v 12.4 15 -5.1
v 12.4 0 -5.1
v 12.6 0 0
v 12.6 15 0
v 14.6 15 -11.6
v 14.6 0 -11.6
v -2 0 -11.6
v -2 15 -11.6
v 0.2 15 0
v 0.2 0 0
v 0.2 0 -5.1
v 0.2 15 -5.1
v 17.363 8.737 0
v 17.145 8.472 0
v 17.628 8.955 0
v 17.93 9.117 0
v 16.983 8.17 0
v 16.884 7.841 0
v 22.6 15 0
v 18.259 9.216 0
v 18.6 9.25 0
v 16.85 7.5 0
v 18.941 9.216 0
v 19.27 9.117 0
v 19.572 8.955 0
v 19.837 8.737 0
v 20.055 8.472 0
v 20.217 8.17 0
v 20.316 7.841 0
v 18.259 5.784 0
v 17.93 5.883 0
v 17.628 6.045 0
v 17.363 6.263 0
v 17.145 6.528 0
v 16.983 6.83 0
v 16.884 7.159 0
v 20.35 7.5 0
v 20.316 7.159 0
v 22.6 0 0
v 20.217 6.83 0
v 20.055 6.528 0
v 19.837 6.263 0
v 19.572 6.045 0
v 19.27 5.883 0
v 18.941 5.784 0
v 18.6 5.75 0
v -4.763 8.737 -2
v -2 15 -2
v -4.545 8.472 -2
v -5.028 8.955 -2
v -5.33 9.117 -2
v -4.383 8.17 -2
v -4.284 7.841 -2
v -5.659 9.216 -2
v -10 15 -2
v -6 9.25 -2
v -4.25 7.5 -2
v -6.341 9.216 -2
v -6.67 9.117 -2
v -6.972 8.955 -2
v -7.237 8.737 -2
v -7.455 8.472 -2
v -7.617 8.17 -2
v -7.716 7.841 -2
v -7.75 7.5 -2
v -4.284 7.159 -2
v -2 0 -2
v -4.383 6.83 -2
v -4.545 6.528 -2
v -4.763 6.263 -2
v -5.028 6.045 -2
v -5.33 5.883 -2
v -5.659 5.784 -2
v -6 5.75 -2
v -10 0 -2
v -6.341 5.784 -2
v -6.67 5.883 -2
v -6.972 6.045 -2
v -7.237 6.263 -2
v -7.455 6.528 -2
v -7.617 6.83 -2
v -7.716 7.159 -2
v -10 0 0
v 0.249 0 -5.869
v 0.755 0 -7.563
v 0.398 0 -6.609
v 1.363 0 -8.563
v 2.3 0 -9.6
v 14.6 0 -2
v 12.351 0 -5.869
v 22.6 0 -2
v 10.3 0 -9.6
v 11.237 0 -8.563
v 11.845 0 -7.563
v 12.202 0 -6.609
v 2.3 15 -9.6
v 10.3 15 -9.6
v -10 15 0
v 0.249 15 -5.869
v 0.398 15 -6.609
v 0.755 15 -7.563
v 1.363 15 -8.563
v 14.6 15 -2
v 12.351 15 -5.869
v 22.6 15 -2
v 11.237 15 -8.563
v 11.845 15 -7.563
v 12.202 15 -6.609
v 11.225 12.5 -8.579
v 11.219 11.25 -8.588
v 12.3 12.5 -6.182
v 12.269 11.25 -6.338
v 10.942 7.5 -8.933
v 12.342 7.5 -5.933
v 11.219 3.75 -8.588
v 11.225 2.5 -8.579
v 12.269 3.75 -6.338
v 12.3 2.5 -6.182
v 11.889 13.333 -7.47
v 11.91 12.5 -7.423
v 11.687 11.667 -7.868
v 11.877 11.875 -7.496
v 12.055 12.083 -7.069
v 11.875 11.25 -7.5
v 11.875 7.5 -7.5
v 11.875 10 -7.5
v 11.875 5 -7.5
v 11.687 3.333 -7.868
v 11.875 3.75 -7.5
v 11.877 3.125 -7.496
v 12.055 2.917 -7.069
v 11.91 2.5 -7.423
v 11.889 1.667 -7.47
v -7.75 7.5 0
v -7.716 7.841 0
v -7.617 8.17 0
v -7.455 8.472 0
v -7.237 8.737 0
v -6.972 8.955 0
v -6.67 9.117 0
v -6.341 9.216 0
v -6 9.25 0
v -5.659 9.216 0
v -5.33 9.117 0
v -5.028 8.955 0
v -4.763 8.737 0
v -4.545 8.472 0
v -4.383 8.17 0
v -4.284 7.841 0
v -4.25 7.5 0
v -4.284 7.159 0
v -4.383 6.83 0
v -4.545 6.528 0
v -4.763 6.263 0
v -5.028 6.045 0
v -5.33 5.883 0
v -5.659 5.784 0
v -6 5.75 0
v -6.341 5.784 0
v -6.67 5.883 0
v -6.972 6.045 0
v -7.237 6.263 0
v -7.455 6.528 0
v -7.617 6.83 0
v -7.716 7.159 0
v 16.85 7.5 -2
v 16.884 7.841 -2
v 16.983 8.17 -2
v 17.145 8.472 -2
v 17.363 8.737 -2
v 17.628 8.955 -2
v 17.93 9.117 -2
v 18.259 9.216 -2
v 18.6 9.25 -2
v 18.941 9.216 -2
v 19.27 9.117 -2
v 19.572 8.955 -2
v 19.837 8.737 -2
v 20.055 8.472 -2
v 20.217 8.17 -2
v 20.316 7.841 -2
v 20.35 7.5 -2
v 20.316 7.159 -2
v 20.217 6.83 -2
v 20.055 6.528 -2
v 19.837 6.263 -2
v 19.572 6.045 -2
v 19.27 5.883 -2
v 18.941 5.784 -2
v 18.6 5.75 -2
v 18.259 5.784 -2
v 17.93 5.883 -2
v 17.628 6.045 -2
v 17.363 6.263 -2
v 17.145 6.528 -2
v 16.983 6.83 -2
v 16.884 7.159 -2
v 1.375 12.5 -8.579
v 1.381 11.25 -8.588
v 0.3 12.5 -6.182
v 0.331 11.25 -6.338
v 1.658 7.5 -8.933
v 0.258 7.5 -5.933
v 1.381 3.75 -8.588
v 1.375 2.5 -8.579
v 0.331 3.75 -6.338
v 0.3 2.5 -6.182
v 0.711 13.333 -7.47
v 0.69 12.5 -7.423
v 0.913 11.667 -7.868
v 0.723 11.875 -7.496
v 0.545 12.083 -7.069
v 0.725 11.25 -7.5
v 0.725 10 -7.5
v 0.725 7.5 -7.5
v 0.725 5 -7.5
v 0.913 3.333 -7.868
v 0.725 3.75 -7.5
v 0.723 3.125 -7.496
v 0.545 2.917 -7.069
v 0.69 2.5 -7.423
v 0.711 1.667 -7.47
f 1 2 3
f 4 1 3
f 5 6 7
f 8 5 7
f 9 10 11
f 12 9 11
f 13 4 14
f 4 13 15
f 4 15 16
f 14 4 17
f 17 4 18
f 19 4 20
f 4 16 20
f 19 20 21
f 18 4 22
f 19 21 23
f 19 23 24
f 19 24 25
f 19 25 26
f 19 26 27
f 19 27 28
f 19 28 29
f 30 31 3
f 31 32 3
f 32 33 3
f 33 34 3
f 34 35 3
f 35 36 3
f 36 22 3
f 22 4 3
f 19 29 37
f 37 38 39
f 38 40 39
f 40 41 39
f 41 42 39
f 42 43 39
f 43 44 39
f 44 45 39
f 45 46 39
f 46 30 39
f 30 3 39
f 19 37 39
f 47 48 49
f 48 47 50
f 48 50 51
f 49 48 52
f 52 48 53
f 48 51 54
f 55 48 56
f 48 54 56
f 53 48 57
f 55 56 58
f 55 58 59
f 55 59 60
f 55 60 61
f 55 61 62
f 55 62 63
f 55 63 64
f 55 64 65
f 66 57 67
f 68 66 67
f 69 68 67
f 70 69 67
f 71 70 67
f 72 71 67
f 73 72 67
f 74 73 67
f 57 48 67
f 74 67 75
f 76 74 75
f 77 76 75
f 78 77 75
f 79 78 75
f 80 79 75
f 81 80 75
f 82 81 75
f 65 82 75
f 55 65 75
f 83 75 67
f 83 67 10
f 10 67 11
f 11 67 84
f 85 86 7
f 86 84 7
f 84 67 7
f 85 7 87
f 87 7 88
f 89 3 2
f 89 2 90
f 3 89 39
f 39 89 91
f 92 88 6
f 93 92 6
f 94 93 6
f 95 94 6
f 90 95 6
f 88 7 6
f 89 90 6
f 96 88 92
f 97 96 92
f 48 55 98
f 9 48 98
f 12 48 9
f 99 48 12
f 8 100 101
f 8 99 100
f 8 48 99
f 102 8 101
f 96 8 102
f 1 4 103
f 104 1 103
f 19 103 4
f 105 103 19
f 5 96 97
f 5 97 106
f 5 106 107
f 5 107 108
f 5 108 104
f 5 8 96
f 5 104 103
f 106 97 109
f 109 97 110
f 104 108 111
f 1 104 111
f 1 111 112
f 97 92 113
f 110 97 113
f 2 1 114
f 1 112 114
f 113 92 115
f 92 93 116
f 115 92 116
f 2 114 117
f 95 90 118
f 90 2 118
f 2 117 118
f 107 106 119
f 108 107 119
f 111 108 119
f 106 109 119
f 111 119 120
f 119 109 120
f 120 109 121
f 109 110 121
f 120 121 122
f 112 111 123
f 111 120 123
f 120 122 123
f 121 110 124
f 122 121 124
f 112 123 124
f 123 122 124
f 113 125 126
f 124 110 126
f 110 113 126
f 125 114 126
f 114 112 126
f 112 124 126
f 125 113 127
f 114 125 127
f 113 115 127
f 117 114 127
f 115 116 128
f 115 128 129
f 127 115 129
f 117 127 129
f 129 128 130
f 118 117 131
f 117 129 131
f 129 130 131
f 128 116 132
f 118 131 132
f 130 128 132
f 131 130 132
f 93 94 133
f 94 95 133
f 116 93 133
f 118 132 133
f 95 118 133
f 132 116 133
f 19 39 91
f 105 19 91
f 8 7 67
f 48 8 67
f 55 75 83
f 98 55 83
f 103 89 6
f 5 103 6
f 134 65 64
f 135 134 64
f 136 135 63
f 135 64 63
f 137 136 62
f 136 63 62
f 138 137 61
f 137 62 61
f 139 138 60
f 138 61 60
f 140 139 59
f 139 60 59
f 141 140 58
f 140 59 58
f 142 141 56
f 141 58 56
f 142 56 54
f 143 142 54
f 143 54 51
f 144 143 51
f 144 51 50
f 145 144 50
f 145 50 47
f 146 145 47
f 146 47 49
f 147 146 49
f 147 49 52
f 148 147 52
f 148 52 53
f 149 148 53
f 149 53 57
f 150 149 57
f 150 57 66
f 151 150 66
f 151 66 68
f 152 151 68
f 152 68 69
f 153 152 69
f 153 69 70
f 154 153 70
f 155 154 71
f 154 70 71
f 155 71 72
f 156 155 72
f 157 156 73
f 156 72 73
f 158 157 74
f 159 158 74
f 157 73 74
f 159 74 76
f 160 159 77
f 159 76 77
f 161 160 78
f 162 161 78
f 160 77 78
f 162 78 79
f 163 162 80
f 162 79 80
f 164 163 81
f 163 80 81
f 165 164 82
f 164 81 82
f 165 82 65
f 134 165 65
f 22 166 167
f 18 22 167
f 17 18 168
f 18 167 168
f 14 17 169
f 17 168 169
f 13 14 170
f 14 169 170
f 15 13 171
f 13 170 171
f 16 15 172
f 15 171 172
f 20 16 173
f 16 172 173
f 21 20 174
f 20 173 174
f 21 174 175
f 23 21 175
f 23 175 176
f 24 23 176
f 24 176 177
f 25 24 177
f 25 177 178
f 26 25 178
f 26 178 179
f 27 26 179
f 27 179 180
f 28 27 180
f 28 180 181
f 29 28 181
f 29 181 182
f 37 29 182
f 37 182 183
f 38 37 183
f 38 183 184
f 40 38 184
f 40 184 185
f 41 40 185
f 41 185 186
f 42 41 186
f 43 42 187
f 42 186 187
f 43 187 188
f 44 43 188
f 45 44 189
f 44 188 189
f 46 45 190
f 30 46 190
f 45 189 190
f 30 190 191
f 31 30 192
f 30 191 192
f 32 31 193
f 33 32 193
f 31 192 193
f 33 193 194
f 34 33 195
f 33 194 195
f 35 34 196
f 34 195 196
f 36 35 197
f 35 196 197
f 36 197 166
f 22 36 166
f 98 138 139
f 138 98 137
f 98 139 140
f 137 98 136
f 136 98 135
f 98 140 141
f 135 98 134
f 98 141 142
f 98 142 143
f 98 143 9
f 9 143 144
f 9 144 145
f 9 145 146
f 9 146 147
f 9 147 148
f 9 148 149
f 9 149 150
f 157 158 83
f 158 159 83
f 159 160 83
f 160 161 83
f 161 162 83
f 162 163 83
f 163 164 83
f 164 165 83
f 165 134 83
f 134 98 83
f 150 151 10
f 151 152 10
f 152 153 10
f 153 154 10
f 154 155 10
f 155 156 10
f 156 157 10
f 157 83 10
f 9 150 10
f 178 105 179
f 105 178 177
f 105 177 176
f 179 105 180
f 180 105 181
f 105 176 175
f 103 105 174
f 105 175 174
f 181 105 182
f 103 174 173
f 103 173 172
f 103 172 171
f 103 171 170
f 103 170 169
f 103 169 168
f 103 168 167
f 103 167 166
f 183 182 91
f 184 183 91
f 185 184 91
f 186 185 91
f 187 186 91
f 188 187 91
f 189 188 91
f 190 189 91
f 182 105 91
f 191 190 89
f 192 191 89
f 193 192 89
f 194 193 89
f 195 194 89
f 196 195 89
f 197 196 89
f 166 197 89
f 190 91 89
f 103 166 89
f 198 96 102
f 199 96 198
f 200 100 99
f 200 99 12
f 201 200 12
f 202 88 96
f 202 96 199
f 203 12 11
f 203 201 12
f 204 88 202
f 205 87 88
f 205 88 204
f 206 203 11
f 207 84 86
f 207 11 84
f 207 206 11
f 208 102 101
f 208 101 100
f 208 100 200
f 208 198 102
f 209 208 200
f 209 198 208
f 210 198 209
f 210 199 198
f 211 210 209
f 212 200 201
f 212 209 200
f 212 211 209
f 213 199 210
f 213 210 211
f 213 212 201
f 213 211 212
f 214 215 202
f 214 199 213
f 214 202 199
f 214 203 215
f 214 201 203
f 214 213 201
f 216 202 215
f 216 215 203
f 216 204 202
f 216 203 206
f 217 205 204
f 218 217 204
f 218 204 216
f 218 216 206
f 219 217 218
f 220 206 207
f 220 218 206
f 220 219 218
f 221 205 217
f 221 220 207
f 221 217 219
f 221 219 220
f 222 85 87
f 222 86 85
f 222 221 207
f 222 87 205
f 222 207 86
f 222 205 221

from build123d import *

# Parameters (mm, degrees)
BOSS_EXTRUDE1_DEPTH = 15
SKETCH2_R           = 1.75
CUT_EXTRUDE1_DEPTH  = 15


with BuildPart() as part:
    # Sketch1 → Boss-Extrude1 (new body)
    with BuildSketch(Plane(origin=(0, 0, 0), x_dir=(1, 0, 0), z_dir=(0, 1, 0))):
        with BuildLine():
            Line((12.4, 5.1), (12.6, 0))
            Line((12.6, 0), (22.6, 0))
            Line((22.6, 0), (22.6, 2))
            Line((22.6, 2), (14.6, 2))
            Line((14.6, 2), (14.6, 11.6))
            Line((14.6, 11.6), (-2, 11.6))
            Line((-2, 11.6), (-2, 2))
            Line((-2, 2), (-10, 2))
            Line((-10, 2), (-10, 0))
            Line((-10, 0), (0, 0))
            Line((0, 0), (0.2, 0))
            Line((0.2, 0), (0.2, 5.1))
            add(Edge.make_bspline(
                [(2.3, 9.6), (0.2, 7.65), (0.2, 5.1)],
                knots=[0, 0, 0, 0.5, 0.5, 0.5], degree=2))
            Line((2.3, 9.6), (10.3, 9.6))
            add(Edge.make_bspline(
                [(10.3, 9.6), (12.4, 7.65), (12.4, 5.1)],
                knots=[0, 0, 0, 0.5, 0.5, 0.5], degree=2))
        make_face()
    extrude(amount=BOSS_EXTRUDE1_DEPTH)

    # Sketch2 → Cut-Extrude1 (cut)
    with BuildSketch(Plane(origin=(0, 0, -2), x_dir=(-1, 0, 0), z_dir=(0, 0, -1))):
        with Locations((-18.6, 7.5)):
            Circle(SKETCH2_R)
        with Locations((6, 7.5)):
            Circle(SKETCH2_R)
    extrude(amount=-CUT_EXTRUDE1_DEPTH, mode=Mode.SUBTRACT)


solid = part.part
